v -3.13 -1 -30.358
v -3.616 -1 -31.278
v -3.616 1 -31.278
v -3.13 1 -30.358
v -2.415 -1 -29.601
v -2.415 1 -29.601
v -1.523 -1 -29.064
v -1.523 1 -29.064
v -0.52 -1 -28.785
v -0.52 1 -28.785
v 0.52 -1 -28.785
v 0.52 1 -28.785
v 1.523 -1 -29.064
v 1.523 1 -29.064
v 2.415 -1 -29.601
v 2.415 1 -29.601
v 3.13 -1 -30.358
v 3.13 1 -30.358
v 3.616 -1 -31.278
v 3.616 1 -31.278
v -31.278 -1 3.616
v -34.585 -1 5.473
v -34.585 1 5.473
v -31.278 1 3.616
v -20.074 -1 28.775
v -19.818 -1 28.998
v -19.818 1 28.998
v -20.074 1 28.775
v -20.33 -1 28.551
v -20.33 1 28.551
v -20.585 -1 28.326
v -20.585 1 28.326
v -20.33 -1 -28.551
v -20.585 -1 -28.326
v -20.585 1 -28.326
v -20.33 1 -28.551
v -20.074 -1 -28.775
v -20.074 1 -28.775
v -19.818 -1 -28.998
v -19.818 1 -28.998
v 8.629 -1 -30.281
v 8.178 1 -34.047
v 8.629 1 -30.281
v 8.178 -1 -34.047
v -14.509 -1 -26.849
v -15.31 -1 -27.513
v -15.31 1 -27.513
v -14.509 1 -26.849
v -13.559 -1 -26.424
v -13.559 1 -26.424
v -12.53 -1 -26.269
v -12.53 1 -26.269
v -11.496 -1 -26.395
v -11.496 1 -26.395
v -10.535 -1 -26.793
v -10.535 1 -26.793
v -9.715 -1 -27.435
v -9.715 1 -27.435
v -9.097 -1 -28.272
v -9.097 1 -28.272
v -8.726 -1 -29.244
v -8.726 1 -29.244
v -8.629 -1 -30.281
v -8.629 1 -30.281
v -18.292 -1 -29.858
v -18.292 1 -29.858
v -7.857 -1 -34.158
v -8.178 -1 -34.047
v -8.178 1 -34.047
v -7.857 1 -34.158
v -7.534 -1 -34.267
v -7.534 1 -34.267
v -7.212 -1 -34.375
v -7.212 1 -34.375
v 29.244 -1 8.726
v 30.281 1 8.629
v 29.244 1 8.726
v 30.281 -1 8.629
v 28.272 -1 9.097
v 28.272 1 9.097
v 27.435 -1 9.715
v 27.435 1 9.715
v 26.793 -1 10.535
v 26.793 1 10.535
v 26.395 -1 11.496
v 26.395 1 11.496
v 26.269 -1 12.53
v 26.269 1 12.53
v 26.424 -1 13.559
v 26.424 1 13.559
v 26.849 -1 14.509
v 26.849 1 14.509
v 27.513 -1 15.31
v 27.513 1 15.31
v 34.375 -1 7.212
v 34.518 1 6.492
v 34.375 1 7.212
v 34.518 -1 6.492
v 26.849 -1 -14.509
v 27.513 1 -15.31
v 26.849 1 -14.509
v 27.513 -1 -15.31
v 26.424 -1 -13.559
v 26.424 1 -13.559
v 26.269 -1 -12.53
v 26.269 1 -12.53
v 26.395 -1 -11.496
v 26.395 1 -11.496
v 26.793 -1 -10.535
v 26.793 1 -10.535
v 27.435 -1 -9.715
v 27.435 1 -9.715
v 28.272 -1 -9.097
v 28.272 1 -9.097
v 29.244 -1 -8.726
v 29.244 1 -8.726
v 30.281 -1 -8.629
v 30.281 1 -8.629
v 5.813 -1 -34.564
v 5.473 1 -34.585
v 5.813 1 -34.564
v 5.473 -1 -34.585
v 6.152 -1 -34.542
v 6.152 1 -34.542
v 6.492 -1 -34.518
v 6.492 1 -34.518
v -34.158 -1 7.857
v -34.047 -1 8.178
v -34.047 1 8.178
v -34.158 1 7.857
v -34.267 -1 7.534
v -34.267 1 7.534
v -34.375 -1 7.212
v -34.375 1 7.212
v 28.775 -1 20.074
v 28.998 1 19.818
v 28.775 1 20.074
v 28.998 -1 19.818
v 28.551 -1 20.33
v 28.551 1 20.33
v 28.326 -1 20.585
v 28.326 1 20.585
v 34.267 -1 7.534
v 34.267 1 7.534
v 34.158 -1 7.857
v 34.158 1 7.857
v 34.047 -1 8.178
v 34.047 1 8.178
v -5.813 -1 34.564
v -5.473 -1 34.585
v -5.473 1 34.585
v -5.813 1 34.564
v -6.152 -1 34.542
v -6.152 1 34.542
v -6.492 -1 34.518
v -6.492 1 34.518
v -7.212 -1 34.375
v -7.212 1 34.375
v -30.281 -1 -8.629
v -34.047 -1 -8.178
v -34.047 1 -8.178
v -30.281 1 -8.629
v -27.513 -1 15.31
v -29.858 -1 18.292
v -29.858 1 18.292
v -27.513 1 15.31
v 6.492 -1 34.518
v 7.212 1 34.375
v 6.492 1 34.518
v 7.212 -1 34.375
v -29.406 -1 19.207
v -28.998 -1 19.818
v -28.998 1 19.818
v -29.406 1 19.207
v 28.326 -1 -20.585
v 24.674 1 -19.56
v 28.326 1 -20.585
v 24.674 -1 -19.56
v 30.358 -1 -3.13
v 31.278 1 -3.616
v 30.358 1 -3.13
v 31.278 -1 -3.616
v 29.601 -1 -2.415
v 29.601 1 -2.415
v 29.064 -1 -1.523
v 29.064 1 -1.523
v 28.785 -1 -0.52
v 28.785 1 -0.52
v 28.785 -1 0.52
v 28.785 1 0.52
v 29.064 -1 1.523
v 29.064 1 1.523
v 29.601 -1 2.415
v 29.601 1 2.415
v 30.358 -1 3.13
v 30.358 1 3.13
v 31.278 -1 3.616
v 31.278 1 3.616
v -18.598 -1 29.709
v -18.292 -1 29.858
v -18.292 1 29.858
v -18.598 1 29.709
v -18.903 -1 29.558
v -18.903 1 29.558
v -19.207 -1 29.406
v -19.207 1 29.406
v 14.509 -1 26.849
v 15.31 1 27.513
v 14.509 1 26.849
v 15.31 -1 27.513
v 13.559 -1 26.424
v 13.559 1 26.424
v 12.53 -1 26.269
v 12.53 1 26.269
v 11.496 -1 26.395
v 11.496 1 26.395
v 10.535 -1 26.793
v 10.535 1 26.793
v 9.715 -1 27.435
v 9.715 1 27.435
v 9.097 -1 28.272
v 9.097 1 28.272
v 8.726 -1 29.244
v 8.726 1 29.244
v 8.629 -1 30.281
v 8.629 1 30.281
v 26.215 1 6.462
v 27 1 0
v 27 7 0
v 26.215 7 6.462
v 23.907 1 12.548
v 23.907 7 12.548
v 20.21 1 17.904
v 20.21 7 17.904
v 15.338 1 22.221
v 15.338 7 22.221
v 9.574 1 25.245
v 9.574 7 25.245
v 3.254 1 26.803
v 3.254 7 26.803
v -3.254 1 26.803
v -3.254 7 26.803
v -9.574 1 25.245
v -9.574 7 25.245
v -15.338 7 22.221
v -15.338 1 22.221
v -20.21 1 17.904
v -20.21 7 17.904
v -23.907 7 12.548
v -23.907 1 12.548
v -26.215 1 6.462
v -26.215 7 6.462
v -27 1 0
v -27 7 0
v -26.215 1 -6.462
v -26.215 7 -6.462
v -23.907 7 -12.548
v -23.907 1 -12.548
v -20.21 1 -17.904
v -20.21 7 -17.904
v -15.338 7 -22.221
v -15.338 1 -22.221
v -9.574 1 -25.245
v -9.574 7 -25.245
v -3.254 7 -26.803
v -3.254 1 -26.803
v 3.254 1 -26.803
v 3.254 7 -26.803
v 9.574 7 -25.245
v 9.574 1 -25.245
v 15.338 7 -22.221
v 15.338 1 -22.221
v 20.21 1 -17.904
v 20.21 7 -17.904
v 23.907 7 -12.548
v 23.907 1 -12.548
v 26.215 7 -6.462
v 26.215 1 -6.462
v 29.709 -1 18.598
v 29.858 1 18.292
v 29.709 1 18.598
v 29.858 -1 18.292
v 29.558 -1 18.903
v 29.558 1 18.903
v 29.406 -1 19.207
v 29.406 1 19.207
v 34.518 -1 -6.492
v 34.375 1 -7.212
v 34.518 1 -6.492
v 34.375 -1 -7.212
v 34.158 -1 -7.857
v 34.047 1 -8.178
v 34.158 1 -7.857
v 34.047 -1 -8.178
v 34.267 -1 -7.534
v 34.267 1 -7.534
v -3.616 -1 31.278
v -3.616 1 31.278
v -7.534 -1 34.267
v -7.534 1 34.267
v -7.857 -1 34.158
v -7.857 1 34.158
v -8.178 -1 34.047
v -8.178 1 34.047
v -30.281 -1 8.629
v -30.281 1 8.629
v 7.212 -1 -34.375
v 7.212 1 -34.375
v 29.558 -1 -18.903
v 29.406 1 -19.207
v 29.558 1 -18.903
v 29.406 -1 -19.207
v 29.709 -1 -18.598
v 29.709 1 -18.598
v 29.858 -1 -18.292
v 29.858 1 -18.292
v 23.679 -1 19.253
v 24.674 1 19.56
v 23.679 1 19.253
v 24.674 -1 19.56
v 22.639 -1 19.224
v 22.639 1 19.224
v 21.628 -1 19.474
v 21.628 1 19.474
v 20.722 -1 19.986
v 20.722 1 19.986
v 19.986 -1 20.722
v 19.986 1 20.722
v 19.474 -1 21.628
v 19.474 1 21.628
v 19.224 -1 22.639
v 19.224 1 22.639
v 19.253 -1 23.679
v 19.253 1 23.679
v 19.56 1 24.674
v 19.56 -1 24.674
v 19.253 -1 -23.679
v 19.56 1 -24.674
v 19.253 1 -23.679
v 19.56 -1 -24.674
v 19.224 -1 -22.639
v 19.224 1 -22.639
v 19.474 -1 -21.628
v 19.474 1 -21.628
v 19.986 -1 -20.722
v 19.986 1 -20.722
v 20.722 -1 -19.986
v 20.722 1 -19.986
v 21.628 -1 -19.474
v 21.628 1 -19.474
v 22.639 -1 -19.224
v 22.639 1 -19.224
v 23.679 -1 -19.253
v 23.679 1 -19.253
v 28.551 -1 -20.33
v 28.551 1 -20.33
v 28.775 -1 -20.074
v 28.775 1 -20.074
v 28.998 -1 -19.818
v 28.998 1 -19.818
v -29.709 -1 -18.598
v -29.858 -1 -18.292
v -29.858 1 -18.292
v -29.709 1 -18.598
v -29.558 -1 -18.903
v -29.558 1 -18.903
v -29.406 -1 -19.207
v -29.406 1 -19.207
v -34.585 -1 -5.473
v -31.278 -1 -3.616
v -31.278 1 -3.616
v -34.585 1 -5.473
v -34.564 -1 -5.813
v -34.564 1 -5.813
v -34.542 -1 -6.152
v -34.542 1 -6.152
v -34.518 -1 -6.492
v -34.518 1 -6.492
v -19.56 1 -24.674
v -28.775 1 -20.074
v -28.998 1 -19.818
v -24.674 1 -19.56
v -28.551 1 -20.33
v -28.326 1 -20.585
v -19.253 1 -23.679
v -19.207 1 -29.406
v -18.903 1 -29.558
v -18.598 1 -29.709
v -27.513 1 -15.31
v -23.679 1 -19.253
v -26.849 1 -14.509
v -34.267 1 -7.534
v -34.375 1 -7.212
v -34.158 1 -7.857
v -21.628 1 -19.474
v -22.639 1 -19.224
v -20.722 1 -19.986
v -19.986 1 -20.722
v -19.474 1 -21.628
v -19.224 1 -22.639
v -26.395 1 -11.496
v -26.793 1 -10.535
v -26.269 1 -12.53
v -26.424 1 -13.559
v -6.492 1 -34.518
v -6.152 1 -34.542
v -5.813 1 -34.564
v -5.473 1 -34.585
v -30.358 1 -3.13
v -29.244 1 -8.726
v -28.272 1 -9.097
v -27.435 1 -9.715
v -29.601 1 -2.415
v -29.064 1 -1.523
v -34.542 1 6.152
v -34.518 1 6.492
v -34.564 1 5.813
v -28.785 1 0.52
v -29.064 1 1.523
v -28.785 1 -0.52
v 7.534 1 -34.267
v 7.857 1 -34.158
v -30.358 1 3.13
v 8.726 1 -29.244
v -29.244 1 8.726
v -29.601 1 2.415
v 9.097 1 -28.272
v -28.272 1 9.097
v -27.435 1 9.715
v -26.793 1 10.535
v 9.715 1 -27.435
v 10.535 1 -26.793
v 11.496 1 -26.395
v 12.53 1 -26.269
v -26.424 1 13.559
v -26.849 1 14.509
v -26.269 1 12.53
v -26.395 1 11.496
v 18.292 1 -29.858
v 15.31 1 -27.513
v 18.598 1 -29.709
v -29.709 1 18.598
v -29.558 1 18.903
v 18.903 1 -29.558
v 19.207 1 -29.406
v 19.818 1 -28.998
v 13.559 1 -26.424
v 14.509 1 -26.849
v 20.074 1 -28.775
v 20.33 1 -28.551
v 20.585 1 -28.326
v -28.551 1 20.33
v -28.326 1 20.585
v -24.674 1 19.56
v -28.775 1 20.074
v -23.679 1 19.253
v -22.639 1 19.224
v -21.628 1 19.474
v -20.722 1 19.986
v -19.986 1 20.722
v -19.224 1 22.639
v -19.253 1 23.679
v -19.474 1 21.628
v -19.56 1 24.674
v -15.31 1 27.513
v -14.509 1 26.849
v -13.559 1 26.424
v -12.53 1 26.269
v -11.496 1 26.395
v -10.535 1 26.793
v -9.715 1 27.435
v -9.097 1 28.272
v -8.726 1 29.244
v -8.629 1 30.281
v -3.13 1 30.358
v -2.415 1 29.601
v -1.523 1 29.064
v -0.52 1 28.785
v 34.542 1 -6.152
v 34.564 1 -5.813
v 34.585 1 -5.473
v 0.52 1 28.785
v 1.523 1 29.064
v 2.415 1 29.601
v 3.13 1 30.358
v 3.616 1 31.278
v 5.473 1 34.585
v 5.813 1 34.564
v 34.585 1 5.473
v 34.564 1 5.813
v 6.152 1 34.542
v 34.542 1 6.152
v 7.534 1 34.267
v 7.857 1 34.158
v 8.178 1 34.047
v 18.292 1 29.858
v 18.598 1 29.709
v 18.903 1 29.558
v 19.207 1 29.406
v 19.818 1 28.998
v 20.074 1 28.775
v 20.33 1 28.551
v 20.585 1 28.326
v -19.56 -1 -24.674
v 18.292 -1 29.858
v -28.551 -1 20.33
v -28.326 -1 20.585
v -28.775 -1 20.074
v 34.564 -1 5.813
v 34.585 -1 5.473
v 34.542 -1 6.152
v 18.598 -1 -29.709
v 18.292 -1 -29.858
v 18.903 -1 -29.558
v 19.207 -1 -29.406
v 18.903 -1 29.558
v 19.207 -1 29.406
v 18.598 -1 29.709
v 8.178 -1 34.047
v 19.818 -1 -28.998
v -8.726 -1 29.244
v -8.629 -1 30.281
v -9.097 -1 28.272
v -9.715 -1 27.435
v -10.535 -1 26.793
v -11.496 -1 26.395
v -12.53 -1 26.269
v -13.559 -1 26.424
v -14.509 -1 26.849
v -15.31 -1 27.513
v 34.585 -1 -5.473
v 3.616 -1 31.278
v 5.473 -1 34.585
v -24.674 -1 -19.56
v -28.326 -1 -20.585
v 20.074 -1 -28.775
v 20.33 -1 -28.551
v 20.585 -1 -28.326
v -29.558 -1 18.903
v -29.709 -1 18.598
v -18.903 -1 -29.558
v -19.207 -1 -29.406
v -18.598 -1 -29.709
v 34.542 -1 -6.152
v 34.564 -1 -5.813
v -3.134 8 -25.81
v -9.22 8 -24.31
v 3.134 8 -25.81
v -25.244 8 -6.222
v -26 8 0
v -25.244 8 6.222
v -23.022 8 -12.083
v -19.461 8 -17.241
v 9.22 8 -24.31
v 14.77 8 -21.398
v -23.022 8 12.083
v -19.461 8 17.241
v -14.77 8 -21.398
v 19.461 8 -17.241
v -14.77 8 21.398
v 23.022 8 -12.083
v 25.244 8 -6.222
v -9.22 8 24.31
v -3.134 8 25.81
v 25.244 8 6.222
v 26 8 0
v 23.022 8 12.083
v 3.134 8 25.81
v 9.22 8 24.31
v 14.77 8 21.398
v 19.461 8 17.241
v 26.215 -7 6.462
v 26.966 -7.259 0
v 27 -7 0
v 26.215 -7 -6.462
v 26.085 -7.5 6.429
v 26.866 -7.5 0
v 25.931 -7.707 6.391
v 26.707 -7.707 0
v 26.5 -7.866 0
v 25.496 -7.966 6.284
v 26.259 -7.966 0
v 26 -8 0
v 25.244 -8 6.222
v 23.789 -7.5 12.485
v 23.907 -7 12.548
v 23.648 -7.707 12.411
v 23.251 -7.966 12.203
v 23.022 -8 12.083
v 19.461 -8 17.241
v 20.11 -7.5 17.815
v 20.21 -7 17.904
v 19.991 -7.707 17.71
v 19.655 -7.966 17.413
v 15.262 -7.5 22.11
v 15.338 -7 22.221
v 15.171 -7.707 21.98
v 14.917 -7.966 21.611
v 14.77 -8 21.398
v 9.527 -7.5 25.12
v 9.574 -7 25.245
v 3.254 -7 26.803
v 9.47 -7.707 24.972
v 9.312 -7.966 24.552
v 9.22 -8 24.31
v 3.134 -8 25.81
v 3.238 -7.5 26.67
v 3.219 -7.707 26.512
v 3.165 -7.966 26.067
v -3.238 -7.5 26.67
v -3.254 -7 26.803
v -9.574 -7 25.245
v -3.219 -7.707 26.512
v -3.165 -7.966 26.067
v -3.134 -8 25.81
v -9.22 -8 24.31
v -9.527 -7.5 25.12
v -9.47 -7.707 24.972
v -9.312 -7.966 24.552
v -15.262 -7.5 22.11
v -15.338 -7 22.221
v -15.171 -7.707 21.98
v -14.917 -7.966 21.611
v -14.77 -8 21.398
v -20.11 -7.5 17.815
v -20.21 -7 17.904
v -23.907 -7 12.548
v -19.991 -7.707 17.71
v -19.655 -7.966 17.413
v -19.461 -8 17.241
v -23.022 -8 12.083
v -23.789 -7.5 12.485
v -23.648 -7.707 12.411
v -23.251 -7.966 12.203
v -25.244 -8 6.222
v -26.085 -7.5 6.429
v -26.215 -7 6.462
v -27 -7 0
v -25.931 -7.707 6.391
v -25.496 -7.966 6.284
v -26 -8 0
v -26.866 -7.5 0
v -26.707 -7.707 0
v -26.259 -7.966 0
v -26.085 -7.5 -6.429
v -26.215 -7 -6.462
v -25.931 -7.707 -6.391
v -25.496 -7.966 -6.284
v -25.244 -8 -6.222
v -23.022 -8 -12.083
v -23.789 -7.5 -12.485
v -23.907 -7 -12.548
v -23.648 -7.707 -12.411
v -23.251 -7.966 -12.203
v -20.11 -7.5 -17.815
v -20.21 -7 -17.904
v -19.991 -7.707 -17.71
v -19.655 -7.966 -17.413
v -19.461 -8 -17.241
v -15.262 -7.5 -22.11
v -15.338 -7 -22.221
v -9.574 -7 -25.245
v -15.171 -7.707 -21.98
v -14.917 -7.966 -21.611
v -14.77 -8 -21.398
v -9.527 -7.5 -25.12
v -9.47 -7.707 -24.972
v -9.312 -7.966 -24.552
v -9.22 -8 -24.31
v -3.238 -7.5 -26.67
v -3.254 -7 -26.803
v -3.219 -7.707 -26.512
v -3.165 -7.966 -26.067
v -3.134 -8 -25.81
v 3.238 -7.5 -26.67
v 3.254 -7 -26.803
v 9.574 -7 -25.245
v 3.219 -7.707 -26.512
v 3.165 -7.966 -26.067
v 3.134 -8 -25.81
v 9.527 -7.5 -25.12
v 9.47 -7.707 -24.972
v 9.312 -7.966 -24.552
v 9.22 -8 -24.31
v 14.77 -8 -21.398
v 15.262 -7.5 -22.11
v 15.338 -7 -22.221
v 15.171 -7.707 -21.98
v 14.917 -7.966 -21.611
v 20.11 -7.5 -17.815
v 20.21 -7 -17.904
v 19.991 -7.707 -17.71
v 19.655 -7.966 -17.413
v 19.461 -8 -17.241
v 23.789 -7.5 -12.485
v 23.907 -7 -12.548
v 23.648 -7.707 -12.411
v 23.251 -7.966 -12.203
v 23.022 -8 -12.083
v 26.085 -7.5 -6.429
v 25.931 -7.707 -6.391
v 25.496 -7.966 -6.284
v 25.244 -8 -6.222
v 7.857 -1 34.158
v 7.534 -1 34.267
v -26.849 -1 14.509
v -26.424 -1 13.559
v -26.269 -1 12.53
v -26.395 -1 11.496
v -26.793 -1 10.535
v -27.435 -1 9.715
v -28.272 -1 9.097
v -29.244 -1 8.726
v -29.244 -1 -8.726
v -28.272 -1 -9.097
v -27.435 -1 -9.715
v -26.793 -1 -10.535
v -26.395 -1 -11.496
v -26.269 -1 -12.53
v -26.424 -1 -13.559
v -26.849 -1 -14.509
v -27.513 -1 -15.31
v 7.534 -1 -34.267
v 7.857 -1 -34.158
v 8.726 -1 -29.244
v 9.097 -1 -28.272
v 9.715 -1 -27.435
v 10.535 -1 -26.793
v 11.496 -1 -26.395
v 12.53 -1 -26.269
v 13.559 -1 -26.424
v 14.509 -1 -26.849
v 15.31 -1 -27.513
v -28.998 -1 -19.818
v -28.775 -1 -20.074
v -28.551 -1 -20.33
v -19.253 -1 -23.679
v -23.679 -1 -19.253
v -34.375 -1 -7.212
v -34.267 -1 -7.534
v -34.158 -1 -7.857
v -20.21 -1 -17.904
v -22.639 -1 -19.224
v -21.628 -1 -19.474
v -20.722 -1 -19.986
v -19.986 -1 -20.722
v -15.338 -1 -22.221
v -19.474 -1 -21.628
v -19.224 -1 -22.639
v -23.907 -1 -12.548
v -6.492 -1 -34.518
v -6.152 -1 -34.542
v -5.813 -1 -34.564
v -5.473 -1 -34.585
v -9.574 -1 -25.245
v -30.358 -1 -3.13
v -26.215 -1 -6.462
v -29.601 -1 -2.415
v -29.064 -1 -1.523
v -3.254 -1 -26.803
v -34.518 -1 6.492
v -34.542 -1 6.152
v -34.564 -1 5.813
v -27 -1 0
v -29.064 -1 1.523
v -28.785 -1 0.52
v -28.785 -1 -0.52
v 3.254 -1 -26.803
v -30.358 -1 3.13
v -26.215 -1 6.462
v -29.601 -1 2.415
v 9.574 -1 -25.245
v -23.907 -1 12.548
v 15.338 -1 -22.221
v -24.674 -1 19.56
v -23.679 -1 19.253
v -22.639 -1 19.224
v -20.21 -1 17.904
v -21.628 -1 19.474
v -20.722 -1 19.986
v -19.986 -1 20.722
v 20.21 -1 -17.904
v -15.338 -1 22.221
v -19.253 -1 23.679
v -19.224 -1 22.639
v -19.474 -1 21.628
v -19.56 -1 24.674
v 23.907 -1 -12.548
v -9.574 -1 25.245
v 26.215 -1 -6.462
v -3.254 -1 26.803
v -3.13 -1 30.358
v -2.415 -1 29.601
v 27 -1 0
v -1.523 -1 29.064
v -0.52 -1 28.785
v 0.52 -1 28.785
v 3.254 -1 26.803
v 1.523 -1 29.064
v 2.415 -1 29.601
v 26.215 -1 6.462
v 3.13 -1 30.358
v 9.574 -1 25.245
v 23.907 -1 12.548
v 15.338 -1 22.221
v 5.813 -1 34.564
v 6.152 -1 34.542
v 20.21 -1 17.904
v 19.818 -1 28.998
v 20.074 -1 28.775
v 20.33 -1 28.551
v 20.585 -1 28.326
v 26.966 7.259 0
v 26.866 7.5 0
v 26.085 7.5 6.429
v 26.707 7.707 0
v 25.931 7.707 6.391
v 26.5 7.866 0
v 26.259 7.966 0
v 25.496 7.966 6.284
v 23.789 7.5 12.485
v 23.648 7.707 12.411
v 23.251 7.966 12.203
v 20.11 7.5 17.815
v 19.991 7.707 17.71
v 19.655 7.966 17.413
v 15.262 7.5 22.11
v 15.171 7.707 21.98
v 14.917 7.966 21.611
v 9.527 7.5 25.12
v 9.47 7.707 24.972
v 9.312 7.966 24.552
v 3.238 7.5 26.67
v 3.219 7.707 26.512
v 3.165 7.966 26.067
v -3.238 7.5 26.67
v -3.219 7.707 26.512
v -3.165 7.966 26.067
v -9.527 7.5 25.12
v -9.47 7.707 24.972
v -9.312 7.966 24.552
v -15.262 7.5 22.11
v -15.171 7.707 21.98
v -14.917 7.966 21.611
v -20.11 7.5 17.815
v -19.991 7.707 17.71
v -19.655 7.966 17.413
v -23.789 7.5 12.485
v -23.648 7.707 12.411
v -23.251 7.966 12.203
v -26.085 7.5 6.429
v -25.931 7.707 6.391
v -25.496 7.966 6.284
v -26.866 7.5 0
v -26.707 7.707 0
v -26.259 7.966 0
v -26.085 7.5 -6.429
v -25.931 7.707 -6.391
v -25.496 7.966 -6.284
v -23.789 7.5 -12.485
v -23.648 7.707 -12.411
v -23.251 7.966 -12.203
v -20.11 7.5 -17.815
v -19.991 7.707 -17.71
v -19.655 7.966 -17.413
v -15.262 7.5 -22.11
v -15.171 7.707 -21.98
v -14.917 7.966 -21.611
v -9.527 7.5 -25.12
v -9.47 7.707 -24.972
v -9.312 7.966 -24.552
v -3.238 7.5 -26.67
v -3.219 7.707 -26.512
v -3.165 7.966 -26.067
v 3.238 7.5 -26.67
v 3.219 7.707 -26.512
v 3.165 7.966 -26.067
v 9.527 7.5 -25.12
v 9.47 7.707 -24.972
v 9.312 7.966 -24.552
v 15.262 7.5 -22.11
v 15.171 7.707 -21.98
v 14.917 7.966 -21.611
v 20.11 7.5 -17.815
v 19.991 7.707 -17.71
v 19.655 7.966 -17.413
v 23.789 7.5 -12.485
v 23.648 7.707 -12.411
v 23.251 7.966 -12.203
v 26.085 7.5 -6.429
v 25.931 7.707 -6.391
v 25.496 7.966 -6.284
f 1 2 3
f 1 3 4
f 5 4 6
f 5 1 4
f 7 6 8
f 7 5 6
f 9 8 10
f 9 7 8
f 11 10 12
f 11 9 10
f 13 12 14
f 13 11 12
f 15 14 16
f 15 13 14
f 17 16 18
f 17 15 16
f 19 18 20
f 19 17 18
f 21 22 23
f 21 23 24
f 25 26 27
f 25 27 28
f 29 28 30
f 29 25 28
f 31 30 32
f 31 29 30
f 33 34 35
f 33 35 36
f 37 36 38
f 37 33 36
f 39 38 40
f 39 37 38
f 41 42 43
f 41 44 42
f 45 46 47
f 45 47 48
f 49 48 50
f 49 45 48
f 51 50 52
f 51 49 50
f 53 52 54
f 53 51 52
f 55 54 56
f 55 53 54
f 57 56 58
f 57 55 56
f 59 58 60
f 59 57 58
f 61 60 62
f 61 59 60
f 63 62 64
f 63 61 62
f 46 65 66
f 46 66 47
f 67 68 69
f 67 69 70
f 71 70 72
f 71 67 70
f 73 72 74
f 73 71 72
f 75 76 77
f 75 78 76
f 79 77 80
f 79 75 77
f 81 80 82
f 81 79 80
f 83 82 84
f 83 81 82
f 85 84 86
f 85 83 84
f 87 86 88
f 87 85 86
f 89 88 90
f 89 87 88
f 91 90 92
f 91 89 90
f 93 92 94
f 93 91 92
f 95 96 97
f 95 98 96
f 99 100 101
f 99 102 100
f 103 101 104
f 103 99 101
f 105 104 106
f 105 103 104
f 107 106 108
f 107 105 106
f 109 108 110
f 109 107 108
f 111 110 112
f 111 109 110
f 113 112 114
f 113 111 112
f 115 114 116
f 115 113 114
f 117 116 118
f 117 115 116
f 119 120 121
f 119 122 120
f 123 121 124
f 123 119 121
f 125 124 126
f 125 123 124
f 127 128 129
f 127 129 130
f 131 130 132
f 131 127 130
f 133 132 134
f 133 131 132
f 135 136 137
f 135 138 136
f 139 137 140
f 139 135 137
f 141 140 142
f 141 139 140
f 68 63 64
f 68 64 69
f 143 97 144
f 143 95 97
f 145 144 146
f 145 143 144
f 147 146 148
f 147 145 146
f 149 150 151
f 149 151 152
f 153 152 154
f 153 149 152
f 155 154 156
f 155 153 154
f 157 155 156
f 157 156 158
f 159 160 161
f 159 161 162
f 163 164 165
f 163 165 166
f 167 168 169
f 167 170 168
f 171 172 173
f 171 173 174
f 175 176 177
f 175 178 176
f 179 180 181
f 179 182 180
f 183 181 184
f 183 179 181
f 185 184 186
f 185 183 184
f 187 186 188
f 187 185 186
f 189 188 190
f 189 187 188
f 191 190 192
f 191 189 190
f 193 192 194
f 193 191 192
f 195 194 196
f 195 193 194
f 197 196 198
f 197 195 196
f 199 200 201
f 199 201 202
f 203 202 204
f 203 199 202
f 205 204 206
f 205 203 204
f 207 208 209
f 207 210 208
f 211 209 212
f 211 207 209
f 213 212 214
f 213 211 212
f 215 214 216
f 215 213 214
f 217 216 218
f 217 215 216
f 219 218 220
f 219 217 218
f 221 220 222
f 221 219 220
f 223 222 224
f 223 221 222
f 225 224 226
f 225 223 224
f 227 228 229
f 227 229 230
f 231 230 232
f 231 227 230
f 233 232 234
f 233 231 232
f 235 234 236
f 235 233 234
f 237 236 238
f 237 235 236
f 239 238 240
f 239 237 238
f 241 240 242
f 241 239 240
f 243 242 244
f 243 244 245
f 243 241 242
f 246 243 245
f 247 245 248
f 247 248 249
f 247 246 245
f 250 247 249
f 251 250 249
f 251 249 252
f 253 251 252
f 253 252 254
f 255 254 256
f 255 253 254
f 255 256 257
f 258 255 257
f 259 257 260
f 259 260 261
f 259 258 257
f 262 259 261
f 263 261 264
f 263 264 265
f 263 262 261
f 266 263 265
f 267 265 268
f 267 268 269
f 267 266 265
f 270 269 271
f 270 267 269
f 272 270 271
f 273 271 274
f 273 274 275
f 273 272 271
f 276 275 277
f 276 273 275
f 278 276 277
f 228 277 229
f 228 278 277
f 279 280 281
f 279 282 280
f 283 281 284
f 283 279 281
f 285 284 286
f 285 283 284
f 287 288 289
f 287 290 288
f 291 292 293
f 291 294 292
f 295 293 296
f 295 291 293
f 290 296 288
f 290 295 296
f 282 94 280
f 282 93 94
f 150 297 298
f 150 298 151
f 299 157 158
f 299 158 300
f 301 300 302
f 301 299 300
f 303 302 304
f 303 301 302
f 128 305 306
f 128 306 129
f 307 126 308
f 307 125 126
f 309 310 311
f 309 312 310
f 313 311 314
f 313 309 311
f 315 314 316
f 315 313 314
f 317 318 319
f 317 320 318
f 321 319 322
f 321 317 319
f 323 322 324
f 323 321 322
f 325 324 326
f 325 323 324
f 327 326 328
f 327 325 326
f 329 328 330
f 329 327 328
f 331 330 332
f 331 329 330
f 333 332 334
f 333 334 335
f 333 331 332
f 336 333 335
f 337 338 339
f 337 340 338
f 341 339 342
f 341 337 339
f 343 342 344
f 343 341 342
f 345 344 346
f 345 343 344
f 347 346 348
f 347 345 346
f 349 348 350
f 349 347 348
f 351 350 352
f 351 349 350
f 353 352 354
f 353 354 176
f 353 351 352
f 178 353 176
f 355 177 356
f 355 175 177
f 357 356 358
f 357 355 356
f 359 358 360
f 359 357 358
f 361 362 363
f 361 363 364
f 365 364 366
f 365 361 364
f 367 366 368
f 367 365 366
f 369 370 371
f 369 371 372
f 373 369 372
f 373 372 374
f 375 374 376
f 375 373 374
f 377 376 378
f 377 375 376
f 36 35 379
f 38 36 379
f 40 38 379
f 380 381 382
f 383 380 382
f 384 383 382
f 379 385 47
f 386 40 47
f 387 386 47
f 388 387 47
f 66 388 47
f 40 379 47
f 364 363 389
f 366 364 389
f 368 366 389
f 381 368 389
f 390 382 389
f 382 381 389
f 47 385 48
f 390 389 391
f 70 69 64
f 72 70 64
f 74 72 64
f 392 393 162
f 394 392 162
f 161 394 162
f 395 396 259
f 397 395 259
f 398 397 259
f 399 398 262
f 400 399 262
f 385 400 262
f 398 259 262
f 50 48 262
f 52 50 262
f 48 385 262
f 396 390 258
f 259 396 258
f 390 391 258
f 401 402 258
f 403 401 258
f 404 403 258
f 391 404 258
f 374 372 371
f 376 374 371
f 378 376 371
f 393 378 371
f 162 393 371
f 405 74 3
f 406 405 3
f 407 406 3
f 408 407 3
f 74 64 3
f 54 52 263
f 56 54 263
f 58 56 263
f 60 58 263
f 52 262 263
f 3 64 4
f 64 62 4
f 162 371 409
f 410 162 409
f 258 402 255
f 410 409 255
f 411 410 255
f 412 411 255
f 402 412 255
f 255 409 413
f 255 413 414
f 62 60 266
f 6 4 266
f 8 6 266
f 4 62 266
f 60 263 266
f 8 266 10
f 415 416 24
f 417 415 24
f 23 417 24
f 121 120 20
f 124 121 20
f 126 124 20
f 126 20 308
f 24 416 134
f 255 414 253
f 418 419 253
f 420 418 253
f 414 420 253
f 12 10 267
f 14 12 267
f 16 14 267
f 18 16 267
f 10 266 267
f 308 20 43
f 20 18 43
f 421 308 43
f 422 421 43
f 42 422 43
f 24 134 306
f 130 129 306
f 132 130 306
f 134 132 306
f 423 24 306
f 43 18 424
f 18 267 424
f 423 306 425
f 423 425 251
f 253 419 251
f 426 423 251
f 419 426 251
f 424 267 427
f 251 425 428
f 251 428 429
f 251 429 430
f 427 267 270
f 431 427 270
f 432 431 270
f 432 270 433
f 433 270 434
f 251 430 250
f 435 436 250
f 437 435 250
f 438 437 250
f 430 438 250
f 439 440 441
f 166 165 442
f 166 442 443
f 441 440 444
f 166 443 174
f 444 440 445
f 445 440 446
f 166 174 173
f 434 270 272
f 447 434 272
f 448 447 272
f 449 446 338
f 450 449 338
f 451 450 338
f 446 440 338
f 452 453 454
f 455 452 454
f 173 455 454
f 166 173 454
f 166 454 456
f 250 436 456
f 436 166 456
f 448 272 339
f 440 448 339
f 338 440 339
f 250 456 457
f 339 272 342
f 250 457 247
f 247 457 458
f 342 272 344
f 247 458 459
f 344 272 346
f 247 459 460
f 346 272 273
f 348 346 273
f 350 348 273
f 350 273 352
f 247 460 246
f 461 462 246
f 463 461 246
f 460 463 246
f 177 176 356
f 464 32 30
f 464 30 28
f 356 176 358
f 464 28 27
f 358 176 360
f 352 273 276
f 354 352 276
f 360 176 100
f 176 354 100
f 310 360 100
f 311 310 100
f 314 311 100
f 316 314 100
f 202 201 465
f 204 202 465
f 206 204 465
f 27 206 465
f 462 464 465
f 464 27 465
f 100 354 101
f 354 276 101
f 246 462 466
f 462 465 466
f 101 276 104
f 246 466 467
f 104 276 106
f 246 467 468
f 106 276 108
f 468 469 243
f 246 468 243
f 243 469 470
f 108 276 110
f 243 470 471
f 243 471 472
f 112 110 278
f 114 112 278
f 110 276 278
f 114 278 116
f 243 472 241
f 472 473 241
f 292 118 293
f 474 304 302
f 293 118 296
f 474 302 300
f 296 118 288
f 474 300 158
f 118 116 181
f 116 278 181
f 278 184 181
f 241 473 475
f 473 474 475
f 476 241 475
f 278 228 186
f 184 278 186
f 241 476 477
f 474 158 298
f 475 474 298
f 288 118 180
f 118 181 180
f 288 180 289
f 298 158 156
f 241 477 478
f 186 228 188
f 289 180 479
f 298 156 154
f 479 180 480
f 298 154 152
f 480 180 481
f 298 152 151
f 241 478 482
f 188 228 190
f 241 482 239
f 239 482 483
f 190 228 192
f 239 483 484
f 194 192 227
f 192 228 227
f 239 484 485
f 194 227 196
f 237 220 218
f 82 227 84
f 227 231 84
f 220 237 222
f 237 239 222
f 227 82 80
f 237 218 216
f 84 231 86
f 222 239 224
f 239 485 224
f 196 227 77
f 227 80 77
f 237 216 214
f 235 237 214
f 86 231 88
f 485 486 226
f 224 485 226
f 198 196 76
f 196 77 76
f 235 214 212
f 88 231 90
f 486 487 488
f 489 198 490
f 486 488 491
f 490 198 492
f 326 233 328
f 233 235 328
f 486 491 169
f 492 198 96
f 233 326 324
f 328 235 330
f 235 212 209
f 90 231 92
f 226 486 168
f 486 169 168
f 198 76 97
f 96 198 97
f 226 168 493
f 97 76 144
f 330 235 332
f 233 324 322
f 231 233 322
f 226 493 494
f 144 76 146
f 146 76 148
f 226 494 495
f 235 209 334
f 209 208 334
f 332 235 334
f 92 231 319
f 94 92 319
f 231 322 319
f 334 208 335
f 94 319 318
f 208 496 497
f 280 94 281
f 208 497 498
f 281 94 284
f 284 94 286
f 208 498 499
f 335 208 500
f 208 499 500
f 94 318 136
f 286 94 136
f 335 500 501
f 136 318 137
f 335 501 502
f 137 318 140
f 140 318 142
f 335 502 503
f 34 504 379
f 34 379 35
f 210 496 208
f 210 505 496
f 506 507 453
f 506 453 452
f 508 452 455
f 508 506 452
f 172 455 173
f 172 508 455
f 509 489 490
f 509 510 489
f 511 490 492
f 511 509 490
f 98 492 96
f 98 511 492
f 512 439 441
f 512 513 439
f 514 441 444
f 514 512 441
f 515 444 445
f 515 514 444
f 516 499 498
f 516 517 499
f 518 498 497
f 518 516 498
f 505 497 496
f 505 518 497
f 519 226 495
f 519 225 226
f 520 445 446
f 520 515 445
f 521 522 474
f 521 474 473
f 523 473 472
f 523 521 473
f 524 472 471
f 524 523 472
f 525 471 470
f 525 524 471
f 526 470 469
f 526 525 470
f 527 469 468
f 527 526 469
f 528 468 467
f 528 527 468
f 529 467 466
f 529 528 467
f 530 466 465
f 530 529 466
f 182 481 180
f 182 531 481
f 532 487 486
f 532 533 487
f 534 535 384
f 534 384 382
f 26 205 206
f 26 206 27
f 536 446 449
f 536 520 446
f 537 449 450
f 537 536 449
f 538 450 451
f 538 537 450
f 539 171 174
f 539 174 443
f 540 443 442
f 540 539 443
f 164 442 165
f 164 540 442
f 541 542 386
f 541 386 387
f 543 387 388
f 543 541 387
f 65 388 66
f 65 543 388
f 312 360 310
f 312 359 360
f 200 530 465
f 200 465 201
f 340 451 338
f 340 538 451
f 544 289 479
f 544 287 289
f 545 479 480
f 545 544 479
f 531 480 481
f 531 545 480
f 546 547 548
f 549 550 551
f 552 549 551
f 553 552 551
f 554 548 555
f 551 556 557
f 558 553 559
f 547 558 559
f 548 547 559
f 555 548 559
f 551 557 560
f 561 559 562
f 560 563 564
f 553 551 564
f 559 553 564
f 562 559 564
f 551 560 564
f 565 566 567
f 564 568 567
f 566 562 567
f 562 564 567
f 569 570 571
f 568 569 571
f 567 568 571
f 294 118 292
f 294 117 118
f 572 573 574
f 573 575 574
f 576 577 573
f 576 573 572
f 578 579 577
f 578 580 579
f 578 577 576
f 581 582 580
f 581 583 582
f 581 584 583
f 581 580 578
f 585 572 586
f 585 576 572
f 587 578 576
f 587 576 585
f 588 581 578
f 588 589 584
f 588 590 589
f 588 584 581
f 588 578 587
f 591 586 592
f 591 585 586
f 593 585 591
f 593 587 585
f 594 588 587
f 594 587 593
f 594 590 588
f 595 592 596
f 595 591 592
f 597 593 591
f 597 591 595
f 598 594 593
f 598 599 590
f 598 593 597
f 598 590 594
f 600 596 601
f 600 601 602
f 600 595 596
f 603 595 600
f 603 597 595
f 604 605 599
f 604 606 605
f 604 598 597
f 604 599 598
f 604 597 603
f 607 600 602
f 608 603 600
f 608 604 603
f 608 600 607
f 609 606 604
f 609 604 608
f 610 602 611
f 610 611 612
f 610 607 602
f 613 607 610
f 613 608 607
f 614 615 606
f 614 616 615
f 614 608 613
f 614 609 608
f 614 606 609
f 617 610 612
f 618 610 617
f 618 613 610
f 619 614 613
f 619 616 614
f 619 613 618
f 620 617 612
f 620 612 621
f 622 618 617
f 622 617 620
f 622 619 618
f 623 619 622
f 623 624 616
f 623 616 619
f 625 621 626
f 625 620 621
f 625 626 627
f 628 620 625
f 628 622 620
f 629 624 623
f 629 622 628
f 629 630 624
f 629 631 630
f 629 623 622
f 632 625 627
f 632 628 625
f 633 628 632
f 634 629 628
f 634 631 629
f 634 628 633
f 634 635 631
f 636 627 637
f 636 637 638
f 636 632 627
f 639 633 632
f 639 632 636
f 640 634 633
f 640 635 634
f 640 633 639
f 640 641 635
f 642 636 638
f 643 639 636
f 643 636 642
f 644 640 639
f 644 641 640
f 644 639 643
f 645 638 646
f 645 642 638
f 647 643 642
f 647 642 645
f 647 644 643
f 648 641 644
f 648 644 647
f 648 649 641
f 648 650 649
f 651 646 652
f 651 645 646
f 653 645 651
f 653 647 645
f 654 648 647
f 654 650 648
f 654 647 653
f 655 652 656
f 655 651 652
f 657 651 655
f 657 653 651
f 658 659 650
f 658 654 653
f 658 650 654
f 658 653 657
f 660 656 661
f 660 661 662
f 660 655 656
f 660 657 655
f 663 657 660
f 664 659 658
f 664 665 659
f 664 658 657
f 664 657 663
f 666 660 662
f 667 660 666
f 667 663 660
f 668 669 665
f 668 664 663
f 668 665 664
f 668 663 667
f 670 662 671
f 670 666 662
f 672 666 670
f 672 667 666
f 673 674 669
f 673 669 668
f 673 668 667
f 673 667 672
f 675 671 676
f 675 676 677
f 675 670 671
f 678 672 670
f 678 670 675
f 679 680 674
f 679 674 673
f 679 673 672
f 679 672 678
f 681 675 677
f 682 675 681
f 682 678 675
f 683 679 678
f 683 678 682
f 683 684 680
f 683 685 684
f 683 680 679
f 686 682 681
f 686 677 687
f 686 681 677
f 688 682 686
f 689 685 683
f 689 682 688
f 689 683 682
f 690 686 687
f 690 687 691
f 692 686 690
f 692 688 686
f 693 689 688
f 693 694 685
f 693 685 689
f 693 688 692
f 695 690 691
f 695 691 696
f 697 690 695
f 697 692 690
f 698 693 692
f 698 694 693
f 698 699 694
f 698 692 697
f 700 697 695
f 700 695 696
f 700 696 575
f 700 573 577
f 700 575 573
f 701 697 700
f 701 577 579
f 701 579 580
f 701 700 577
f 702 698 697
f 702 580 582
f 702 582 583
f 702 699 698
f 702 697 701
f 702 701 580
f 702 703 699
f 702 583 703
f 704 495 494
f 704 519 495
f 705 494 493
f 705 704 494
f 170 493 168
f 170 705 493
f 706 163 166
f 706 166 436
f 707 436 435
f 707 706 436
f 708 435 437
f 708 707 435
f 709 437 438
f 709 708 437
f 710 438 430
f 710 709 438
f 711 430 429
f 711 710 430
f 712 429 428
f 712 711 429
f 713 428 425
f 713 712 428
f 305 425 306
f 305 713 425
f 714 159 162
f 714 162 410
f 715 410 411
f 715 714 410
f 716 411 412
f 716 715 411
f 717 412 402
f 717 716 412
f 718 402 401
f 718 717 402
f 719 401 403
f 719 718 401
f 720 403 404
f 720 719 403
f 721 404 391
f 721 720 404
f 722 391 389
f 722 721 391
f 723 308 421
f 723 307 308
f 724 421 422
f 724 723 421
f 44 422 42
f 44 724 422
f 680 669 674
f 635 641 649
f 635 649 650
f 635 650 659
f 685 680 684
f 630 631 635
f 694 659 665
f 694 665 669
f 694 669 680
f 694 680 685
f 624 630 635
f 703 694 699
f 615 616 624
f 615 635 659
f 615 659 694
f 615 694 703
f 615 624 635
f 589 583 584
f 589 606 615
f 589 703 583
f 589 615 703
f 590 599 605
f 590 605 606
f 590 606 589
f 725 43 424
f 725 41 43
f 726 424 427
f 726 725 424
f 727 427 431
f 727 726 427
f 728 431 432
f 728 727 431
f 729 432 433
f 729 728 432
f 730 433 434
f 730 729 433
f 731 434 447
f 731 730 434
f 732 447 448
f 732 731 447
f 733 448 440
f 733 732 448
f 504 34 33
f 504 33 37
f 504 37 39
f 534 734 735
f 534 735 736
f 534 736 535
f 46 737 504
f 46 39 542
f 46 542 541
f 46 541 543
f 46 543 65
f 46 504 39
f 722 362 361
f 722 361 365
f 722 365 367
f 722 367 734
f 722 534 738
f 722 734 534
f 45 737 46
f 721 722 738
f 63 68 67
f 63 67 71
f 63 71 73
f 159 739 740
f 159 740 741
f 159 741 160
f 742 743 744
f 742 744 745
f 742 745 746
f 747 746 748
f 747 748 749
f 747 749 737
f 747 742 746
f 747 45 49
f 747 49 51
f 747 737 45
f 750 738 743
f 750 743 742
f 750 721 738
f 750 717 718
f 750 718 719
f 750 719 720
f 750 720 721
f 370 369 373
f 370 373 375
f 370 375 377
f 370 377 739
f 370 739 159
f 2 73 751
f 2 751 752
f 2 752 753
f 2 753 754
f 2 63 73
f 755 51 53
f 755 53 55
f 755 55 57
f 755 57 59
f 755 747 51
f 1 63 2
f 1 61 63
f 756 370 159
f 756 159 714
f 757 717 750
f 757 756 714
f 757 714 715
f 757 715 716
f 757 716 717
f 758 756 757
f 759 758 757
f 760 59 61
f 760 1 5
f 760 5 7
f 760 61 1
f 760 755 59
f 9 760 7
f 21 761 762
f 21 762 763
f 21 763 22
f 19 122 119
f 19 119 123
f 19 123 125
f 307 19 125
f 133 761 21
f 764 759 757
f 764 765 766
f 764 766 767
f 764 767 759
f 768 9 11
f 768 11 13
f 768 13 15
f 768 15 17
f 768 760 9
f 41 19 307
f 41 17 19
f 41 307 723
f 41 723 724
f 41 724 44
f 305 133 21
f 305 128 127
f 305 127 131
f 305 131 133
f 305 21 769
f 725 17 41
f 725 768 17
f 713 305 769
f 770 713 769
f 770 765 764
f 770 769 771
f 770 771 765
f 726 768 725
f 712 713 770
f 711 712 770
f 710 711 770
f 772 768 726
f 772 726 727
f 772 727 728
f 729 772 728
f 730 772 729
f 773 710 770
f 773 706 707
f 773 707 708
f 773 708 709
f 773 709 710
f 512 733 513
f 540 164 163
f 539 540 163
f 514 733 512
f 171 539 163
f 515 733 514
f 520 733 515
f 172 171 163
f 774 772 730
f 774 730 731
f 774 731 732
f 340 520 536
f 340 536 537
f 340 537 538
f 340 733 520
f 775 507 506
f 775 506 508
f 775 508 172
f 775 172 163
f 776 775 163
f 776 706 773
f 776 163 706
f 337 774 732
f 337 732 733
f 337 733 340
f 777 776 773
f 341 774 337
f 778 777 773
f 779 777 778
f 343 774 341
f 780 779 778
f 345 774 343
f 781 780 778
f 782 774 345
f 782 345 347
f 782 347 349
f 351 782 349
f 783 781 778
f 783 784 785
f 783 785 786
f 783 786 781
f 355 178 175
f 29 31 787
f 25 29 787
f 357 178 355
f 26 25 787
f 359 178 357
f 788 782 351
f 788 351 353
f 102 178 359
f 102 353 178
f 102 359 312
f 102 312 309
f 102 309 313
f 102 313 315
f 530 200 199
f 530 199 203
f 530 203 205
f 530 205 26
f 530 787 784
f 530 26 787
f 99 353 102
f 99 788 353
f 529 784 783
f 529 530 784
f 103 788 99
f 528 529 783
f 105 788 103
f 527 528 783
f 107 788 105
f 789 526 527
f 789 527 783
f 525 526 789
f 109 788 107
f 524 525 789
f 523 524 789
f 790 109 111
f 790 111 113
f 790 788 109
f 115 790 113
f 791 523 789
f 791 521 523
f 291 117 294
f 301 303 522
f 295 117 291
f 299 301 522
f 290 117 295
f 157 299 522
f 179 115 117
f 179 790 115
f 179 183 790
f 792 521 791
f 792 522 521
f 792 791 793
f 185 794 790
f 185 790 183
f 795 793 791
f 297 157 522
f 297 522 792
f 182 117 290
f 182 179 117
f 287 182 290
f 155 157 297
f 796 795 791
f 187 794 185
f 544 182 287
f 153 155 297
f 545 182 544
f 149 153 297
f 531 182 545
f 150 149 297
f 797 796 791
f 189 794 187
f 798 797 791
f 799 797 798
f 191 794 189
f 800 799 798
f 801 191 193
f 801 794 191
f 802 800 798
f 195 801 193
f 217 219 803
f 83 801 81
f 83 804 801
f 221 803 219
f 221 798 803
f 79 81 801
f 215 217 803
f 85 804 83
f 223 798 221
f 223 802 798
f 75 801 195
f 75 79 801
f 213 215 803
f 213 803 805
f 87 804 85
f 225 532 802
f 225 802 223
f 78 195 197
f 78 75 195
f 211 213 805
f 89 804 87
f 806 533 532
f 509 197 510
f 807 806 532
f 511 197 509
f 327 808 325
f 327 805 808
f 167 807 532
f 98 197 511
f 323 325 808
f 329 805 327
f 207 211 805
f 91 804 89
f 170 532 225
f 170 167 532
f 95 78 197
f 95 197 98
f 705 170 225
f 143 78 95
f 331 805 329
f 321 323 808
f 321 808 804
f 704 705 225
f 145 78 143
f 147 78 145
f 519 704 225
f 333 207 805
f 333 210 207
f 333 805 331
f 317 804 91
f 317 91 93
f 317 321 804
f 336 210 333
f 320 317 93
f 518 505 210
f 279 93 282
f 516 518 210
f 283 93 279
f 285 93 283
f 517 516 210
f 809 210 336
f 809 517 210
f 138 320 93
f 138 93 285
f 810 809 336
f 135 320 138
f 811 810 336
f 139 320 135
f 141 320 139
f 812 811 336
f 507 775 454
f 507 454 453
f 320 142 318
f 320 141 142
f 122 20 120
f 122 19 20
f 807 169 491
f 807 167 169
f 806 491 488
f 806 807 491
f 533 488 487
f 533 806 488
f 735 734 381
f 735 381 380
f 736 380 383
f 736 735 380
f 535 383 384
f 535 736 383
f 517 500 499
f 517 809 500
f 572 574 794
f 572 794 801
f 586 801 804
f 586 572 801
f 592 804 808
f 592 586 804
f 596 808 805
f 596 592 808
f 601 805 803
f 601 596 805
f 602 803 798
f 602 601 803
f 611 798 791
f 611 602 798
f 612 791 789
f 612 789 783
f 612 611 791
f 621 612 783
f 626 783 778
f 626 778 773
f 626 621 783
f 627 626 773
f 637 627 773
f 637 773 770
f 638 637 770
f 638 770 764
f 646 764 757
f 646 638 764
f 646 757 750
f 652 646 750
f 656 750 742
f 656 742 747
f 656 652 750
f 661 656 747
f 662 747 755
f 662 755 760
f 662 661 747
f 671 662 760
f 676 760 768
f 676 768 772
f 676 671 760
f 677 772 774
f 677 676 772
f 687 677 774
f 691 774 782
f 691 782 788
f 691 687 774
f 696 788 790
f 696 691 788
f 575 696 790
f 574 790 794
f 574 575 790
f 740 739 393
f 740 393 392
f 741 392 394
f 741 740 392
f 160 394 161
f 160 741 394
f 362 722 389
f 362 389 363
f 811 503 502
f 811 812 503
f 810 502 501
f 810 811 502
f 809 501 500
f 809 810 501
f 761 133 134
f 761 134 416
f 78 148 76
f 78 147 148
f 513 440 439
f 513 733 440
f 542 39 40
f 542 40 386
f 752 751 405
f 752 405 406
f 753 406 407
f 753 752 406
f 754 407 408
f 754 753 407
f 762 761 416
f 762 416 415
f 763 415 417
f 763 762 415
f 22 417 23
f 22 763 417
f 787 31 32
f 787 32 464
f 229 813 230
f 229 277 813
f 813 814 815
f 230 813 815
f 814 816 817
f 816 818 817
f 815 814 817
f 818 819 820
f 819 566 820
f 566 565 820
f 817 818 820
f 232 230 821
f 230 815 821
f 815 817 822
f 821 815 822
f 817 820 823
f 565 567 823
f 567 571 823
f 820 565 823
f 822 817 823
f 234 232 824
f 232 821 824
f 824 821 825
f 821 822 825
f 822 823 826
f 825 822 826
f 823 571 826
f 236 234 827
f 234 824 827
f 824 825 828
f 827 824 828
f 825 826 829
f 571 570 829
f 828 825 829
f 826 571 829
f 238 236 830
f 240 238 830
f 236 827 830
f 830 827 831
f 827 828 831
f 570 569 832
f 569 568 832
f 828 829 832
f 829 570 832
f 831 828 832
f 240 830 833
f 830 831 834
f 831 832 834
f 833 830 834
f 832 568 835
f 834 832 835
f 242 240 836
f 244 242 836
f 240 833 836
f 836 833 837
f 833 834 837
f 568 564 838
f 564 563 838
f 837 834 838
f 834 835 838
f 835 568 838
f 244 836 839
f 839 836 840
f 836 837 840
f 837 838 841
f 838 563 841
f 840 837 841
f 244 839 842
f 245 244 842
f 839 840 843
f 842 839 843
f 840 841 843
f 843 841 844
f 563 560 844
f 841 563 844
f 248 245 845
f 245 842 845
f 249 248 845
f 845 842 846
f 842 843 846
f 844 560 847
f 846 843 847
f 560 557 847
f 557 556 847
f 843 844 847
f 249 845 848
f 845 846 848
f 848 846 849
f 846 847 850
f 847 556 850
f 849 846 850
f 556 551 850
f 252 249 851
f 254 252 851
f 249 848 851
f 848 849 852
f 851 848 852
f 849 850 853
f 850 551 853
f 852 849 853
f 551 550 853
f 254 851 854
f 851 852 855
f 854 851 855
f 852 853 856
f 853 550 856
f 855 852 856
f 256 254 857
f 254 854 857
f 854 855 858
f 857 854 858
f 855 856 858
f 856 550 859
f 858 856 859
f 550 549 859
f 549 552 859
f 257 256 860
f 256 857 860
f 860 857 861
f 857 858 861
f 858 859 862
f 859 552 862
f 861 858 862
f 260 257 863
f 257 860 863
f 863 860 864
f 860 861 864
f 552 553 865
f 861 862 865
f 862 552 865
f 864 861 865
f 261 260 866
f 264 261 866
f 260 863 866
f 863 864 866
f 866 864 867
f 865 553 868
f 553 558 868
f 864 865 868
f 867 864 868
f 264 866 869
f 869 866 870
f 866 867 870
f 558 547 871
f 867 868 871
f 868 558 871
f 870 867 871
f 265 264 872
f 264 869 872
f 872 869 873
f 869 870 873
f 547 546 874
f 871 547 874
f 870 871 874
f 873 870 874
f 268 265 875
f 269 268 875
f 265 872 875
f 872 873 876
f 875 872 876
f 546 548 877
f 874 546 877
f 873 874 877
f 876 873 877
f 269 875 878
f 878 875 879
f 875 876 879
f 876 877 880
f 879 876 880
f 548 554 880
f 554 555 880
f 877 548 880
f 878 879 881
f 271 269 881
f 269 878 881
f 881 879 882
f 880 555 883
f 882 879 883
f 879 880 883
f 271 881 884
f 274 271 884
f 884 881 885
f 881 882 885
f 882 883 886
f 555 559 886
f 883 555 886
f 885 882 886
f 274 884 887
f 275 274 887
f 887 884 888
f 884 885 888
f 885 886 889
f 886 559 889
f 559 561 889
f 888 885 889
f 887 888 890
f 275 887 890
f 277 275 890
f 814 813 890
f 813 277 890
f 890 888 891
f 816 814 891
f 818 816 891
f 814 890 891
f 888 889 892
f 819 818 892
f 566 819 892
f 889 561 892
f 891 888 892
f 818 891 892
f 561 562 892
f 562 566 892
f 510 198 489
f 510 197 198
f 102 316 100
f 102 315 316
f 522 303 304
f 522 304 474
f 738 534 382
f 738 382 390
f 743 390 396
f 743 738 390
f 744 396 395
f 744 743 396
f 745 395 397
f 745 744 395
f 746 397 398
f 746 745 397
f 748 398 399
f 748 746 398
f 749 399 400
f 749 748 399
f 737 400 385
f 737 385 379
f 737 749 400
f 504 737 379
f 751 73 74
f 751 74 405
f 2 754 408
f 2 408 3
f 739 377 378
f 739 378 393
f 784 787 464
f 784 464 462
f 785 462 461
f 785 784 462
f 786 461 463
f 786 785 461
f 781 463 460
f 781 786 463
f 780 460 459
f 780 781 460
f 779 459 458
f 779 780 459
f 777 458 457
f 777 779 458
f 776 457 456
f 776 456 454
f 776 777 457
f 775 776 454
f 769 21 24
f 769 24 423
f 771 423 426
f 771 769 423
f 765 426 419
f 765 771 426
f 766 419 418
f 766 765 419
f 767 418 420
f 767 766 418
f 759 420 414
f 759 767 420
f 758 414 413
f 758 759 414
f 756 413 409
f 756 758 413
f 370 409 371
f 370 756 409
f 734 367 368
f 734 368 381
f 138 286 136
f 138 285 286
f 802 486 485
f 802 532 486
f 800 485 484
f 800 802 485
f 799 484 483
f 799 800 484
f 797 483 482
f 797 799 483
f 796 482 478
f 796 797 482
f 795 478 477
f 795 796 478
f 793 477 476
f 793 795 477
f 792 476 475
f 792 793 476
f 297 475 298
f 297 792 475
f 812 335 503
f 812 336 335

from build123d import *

# Parameters (mm, degrees)
F0_R     = 27
F1_DEPTH = 1
F2_DEPTH = 8
F3_R     = 1


with BuildPart() as f1:
    # F0 (on Front) → F1 (new body, symmetric)
    with BuildSketch(Plane.XZ):
        with BuildLine():
            ThreePointArc((3.6158782374, 31.2779090152), (0, 28.75), (-3.6158782374, 31.2779090152))
            Line((-3.6158782374, 31.2779090152), (-5.4734823617, 34.5852409081))
            ThreePointArc((-5.4734823617, 34.5852409081), (-5.9827680833, 34.5531193631), (-6.4918656711, 34.5181424295))
            Line((-6.4918656711, 34.5181424295), (-7.2118194024, 34.3749347284))
            ThreePointArc((-7.2118194024, 34.3749347284), (-7.6955493369, 34.2124259891), (-8.1783603743, 34.0472072192))
            Line((-8.1783603743, 34.0472072192), (-8.6289016835, 30.2807566538))
            ThreePointArc((-8.6289016835, 30.2807566538), (-11.0021486805, 26.5615365597), (-15.3101734747, 27.513283264))
            Line((-15.3101734747, 27.513283264), (-18.2920370254, 29.8579851848))
            ThreePointArc((-18.2920370254, 29.8579851848), (-18.7502632967, 29.6334135388), (-19.2072230452, 29.4062758535))
            Line((-19.2072230452, 29.4062758535), (-19.8175703473, 28.9984548245))
            ThreePointArc((-19.8175703473, 28.9984548245), (-20.2022891308, 28.6632008947), (-20.5851218804, 28.3257948698))
            Line((-20.5851218804, 28.3257948698), (-19.5600095444, 24.6736335876))
            ThreePointArc((-19.5600095444, 24.6736335876), (-20.3293199591, 20.3293199591), (-24.6736335876, 19.5600095444))
            Line((-24.6736335876, 19.5600095444), (-28.3257948698, 20.5851218804))
            ThreePointArc((-28.3257948698, 20.5851218804), (-28.6632008947, 20.2022891308), (-28.9984548245, 19.8175703473))
            Line((-28.9984548245, 19.8175703473), (-29.4062758535, 19.2072230452))
            ThreePointArc((-29.4062758535, 19.2072230452), (-29.6334135388, 18.7502632967), (-29.8579851848, 18.2920370254))
            Line((-29.8579851848, 18.2920370254), (-27.513283264, 15.3101734747))
            ThreePointArc((-27.513283264, 15.3101734747), (-26.5615365597, 11.0021486805), (-30.2807566538, 8.6289016835))
            Line((-30.2807566538, 8.6289016835), (-34.0472072192, 8.1783603743))
            ThreePointArc((-34.0472072192, 8.1783603743), (-34.2124259891, 7.6955493369), (-34.3749347284, 7.2118194024))
            Line((-34.3749347284, 7.2118194024), (-34.5181424295, 6.4918656711))
            ThreePointArc((-34.5181424295, 6.4918656711), (-34.5531193631, 5.9827680833), (-34.5852409081, 5.4734823617))
            Line((-34.5852409081, 5.4734823617), (-31.2779090152, 3.6158782374))
            ThreePointArc((-31.2779090152, 3.6158782374), (-28.75, 0), (-31.2779090152, -3.6158782374))
            Line((-31.2779090152, -3.6158782374), (-34.5852409081, -5.4734823617))
            ThreePointArc((-34.5852409081, -5.4734823617), (-34.5531193631, -5.9827680833), (-34.5181424295, -6.4918656711))
            Line((-34.5181424295, -6.4918656711), (-34.3749347284, -7.2118194024))
            ThreePointArc((-34.3749347284, -7.2118194024), (-34.2124259891, -7.6955493369), (-34.0472072192, -8.1783603743))
            Line((-34.0472072192, -8.1783603743), (-30.2807566538, -8.6289016835))
            ThreePointArc((-30.2807566538, -8.6289016835), (-26.5615365597, -11.0021486805), (-27.513283264, -15.3101734747))
            Line((-27.513283264, -15.3101734747), (-29.8579851848, -18.2920370254))
            ThreePointArc((-29.8579851848, -18.2920370254), (-29.6334135388, -18.7502632967), (-29.4062758535, -19.2072230452))
            Line((-29.4062758535, -19.2072230452), (-28.9984548245, -19.8175703473))
            ThreePointArc((-28.9984548245, -19.8175703473), (-28.6632008947, -20.2022891308), (-28.3257948698, -20.5851218804))
            Line((-28.3257948698, -20.5851218804), (-24.6736335876, -19.5600095444))
            ThreePointArc((-24.6736335876, -19.5600095444), (-20.3293199591, -20.3293199591), (-19.5600095444, -24.6736335876))
            Line((-19.5600095444, -24.6736335876), (-20.5851218804, -28.3257948698))
            ThreePointArc((-20.5851218804, -28.3257948698), (-20.2022891308, -28.6632008947), (-19.8175703473, -28.9984548245))
            Line((-19.8175703473, -28.9984548245), (-19.2072230452, -29.4062758535))
            ThreePointArc((-19.2072230452, -29.4062758535), (-18.7502632967, -29.6334135388), (-18.2920370254, -29.8579851848))
            Line((-18.2920370254, -29.8579851848), (-15.3101734747, -27.513283264))
            ThreePointArc((-15.3101734747, -27.513283264), (-11.0021486805, -26.5615365597), (-8.6289016835, -30.2807566538))
            Line((-8.6289016835, -30.2807566538), (-8.1783603743, -34.0472072192))
            ThreePointArc((-8.1783603743, -34.0472072192), (-7.6955493369, -34.2124259891), (-7.2118194024, -34.3749347284))
            Line((-7.2118194024, -34.3749347284), (-6.4918656711, -34.5181424295))
            ThreePointArc((-6.4918656711, -34.5181424295), (-5.9827680833, -34.5531193631), (-5.4734823617, -34.5852409081))
            Line((-5.4734823617, -34.5852409081), (-3.6158782374, -31.2779090152))
            ThreePointArc((-3.6158782374, -31.2779090152), (0, -28.75), (3.6158782374, -31.2779090152))
            Line((3.6158782374, -31.2779090152), (5.4734823617, -34.5852409081))
            ThreePointArc((5.4734823617, -34.5852409081), (5.9827680833, -34.5531193631), (6.4918656711, -34.5181424295))
            Line((6.4918656711, -34.5181424295), (7.2118194024, -34.3749347284))
            ThreePointArc((7.2118194024, -34.3749347284), (7.6955493369, -34.2124259891), (8.1783603743, -34.0472072192))
            Line((8.1783603743, -34.0472072192), (8.6289016835, -30.2807566538))
            ThreePointArc((8.6289016835, -30.2807566538), (11.0021486805, -26.5615365597), (15.3101734747, -27.513283264))
            Line((15.3101734747, -27.513283264), (18.2920370254, -29.8579851848))
            ThreePointArc((18.2920370254, -29.8579851848), (18.7502632967, -29.6334135388), (19.2072230452, -29.4062758535))
            Line((19.2072230452, -29.4062758535), (19.8175703473, -28.9984548245))
            ThreePointArc((19.8175703473, -28.9984548245), (20.2022891308, -28.6632008947), (20.5851218804, -28.3257948698))
            Line((20.5851218804, -28.3257948698), (19.5600095444, -24.6736335876))
            ThreePointArc((19.5600095444, -24.6736335876), (20.3293199591, -20.3293199591), (24.6736335876, -19.5600095444))
            Line((24.6736335876, -19.5600095444), (28.3257948698, -20.5851218804))
            ThreePointArc((28.3257948698, -20.5851218804), (28.6632008947, -20.2022891308), (28.9984548245, -19.8175703473))
            Line((28.9984548245, -19.8175703473), (29.4062758535, -19.2072230452))
            ThreePointArc((29.4062758535, -19.2072230452), (29.6334135388, -18.7502632967), (29.8579851848, -18.2920370254))
            Line((29.8579851848, -18.2920370254), (27.513283264, -15.3101734747))
            ThreePointArc((27.513283264, -15.3101734747), (26.5615365597, -11.0021486805), (30.2807566538, -8.6289016835))
            Line((30.2807566538, -8.6289016835), (34.0472072192, -8.1783603743))
            ThreePointArc((34.0472072192, -8.1783603743), (34.2124259891, -7.6955493369), (34.3749347284, -7.2118194024))
            Line((34.3749347284, -7.2118194024), (34.5181424295, -6.4918656711))
            ThreePointArc((34.5181424295, -6.4918656711), (34.5531193631, -5.9827680833), (34.5852409081, -5.4734823617))
            Line((34.5852409081, -5.4734823617), (31.2779090152, -3.6158782374))
            ThreePointArc((31.2779090152, -3.6158782374), (28.75, 0), (31.2779090152, 3.6158782374))
            Line((31.2779090152, 3.6158782374), (34.5852409081, 5.4734823617))
            ThreePointArc((34.5852409081, 5.4734823617), (34.5531193631, 5.9827680833), (34.5181424295, 6.4918656711))
            Line((34.5181424295, 6.4918656711), (34.3749347284, 7.2118194024))
            ThreePointArc((34.3749347284, 7.2118194024), (34.2124259891, 7.6955493369), (34.0472072192, 8.1783603743))
            Line((34.0472072192, 8.1783603743), (30.2807566538, 8.6289016835))
            ThreePointArc((30.2807566538, 8.6289016835), (26.5615365597, 11.0021486805), (27.513283264, 15.3101734747))
            Line((27.513283264, 15.3101734747), (29.8579851848, 18.2920370254))
            ThreePointArc((29.8579851848, 18.2920370254), (29.6334135388, 18.7502632967), (29.4062758535, 19.2072230452))
            Line((29.4062758535, 19.2072230452), (28.9984548245, 19.8175703473))
            ThreePointArc((28.9984548245, 19.8175703473), (28.6632008947, 20.2022891308), (28.3257948698, 20.5851218804))
            Line((28.3257948698, 20.5851218804), (24.6736335876, 19.5600095444))
            ThreePointArc((24.6736335876, 19.5600095444), (20.3293199591, 20.3293199591), (19.5600095444, 24.6736335876))
            Line((19.5600095444, 24.6736335876), (20.5851218804, 28.3257948698))
            ThreePointArc((20.5851218804, 28.3257948698), (20.2022891308, 28.6632008947), (19.8175703473, 28.9984548245))
            Line((19.8175703473, 28.9984548245), (19.2072230452, 29.4062758535))
            ThreePointArc((19.2072230452, 29.4062758535), (18.7502632967, 29.6334135388), (18.2920370254, 29.8579851848))
            Line((18.2920370254, 29.8579851848), (15.3101734747, 27.513283264))
            ThreePointArc((15.3101734747, 27.513283264), (11.0021486805, 26.5615365597), (8.6289016835, 30.2807566538))
            Line((8.6289016835, 30.2807566538), (8.1783603743, 34.0472072192))
            ThreePointArc((8.1783603743, 34.0472072192), (7.6955493369, 34.2124259891), (7.2118194024, 34.3749347284))
            Line((7.2118194024, 34.3749347284), (6.4918656711, 34.5181424295))
            ThreePointArc((6.4918656711, 34.5181424295), (5.9827680833, 34.5531193631), (5.4734823617, 34.5852409081))
            Line((5.4734823617, 34.5852409081), (3.6158782374, 31.2779090152))
        make_face()
        Circle(F0_R, mode=Mode.SUBTRACT)
    extrude(amount=F1_DEPTH, both=True)

    # F0 (on Front) → F2 (join, symmetric)
    with BuildSketch(Plane.XZ):
        Circle(F0_R)
    extrude(amount=F2_DEPTH, both=True)

    # F3
    f3_edges = [f1.edges().sort_by_distance(p)[0] for p in [
        (-27, -8, 0),
        (-27, 8, 0),
    ]]
    fillet(f3_edges, radius=F3_R)


solid = f1.part
